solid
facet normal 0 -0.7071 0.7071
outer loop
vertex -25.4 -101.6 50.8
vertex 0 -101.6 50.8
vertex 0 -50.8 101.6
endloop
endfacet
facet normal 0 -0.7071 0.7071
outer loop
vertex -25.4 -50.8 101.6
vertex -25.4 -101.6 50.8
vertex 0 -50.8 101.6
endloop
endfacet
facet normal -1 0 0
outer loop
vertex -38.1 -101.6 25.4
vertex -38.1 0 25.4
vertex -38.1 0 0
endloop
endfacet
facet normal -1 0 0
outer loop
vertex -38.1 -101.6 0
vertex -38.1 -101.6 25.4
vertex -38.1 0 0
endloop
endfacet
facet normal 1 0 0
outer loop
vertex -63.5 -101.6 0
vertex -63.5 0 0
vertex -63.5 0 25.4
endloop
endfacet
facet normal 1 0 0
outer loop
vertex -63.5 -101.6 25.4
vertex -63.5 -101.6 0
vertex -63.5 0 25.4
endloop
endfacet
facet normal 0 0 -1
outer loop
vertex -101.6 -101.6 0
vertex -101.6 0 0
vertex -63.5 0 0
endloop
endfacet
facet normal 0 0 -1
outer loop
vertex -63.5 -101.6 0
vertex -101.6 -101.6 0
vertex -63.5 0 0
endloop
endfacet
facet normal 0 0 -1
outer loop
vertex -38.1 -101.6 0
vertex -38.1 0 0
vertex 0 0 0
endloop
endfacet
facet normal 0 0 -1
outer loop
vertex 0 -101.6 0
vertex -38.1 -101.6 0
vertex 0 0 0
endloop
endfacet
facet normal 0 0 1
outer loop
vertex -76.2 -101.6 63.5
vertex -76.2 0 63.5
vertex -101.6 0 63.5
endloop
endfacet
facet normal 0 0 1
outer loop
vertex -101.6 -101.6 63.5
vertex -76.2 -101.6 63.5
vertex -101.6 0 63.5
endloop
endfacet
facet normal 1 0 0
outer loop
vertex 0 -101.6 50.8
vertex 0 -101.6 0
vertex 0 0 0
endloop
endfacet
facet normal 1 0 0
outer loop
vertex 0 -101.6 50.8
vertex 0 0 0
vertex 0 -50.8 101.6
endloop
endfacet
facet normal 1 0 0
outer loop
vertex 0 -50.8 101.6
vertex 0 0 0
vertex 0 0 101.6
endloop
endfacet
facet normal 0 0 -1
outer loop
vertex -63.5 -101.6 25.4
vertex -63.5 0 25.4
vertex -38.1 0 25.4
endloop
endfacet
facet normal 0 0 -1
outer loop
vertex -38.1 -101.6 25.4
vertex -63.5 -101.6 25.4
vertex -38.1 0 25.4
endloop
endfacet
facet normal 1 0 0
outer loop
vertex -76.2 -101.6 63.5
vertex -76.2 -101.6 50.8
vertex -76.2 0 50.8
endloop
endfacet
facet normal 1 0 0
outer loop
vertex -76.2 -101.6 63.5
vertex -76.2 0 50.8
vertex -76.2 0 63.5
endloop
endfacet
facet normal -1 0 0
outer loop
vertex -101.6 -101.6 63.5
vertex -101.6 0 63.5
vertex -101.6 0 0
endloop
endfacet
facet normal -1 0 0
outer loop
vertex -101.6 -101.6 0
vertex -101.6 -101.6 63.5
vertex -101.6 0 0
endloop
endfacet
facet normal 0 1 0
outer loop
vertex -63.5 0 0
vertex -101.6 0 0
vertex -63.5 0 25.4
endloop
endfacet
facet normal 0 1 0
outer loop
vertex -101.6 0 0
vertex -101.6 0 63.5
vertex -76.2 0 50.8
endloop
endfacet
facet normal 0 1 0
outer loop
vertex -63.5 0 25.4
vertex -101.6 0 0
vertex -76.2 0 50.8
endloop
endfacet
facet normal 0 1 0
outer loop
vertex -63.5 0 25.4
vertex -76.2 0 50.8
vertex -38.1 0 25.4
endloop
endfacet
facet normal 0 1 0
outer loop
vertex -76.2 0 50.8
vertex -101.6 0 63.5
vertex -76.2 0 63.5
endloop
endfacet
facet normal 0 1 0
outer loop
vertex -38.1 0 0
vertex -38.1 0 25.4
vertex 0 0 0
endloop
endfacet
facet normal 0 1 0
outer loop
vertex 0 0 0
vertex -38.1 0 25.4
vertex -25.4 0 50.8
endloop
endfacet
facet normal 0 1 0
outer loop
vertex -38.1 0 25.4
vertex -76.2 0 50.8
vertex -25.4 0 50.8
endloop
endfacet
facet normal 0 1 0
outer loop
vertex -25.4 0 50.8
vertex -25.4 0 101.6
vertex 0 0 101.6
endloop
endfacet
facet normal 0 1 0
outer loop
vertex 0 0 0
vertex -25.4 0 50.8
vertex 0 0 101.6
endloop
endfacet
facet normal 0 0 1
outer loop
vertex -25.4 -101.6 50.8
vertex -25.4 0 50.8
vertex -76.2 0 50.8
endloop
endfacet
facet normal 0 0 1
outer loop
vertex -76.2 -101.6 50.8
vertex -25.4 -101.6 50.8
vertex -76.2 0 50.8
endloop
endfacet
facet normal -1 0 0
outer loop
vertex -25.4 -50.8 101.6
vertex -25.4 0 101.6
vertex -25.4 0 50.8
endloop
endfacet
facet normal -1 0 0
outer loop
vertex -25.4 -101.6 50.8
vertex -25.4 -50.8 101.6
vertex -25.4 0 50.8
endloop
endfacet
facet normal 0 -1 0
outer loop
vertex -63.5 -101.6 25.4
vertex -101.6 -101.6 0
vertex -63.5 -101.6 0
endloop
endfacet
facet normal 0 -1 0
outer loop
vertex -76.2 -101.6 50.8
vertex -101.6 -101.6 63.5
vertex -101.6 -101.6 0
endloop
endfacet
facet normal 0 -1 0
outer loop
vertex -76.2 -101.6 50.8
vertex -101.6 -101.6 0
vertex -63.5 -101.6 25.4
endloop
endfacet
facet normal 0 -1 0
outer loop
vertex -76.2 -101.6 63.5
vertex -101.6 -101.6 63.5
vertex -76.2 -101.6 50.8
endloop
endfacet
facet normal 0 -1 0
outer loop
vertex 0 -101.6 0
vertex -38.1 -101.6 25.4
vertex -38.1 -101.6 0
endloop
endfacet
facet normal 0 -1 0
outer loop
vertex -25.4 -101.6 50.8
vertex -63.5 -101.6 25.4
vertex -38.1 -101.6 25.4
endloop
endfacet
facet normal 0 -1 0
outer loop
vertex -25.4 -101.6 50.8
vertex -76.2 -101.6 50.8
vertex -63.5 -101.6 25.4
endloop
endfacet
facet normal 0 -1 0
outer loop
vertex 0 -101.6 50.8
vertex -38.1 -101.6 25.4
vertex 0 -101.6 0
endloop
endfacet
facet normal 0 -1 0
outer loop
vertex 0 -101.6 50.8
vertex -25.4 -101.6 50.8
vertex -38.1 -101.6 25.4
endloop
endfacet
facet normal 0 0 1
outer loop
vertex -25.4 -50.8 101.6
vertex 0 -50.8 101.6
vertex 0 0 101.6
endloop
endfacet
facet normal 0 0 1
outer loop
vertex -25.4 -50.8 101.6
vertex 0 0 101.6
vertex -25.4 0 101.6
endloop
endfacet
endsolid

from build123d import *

# Parameters (mm, degrees)
F1_DEPTH = 101.6
F3_DEPTH = 25.4


with BuildPart() as f1:
    # F0 (on Front) → F1 (new body)
    with BuildSketch(Plane.XZ):
        Polygon((-38.1, 0), (0, 0), (0, 101.6), (-25.4, 101.6), (-25.4, 50.8), (-76.2, 50.8), (-76.2, 63.5), (-101.6, 63.5), (-101.6, 0), (-63.5, 0), (-63.5, 25.4), (-38.1, 25.4), align=None)
    extrude(amount=F1_DEPTH)

    # F2 (on face) → F3 (cut)
    with BuildSketch(Plane.YZ):
        Polygon((-101.6, 101.6), (-101.6, 50.8), (-50.8, 101.6), align=None)
    extrude(amount=-F3_DEPTH, mode=Mode.SUBTRACT)


solid = f1.part
